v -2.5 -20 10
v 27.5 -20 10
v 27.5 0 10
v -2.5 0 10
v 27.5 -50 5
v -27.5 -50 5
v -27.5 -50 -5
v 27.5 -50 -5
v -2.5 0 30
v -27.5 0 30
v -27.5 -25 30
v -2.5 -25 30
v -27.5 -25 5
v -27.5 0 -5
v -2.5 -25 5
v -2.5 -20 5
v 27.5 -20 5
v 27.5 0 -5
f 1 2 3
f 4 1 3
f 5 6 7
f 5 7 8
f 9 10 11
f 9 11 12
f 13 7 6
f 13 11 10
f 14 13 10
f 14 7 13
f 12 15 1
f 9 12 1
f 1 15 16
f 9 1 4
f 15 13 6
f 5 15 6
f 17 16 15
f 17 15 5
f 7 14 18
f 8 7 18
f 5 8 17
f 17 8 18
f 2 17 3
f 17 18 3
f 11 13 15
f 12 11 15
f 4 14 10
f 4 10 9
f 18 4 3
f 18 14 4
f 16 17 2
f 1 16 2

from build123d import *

# Parameters (mm, degrees)
F0_W     = 55
F0_H     = 10
F1_DEPTH = 50
F3_W     = 20
F3_H     = 15
F4_DEPTH = 55
F2_W     = 25
F2_H     = 25
F5_DEPTH = 25


with BuildPart() as f1:
    # F0 (on Front) → F1 (new body)
    with BuildSketch(Plane.XZ):
        Rectangle(F0_W, F0_H)
    extrude(amount=F1_DEPTH)

    # F3 (on face) → F4 (join)
    with BuildSketch(Plane.YZ.offset(27.5)):
        with Locations((-10, 2.5)):
            Rectangle(F3_W, F3_H)
    extrude(amount=-F4_DEPTH)

    # F2 (on face) → F5 (join)
    with BuildSketch(Plane.XY.offset(5)):
        with Locations((-15, -12.5)):
            Rectangle(F2_W, F2_H)
    extrude(amount=F5_DEPTH)


solid = f1.part
